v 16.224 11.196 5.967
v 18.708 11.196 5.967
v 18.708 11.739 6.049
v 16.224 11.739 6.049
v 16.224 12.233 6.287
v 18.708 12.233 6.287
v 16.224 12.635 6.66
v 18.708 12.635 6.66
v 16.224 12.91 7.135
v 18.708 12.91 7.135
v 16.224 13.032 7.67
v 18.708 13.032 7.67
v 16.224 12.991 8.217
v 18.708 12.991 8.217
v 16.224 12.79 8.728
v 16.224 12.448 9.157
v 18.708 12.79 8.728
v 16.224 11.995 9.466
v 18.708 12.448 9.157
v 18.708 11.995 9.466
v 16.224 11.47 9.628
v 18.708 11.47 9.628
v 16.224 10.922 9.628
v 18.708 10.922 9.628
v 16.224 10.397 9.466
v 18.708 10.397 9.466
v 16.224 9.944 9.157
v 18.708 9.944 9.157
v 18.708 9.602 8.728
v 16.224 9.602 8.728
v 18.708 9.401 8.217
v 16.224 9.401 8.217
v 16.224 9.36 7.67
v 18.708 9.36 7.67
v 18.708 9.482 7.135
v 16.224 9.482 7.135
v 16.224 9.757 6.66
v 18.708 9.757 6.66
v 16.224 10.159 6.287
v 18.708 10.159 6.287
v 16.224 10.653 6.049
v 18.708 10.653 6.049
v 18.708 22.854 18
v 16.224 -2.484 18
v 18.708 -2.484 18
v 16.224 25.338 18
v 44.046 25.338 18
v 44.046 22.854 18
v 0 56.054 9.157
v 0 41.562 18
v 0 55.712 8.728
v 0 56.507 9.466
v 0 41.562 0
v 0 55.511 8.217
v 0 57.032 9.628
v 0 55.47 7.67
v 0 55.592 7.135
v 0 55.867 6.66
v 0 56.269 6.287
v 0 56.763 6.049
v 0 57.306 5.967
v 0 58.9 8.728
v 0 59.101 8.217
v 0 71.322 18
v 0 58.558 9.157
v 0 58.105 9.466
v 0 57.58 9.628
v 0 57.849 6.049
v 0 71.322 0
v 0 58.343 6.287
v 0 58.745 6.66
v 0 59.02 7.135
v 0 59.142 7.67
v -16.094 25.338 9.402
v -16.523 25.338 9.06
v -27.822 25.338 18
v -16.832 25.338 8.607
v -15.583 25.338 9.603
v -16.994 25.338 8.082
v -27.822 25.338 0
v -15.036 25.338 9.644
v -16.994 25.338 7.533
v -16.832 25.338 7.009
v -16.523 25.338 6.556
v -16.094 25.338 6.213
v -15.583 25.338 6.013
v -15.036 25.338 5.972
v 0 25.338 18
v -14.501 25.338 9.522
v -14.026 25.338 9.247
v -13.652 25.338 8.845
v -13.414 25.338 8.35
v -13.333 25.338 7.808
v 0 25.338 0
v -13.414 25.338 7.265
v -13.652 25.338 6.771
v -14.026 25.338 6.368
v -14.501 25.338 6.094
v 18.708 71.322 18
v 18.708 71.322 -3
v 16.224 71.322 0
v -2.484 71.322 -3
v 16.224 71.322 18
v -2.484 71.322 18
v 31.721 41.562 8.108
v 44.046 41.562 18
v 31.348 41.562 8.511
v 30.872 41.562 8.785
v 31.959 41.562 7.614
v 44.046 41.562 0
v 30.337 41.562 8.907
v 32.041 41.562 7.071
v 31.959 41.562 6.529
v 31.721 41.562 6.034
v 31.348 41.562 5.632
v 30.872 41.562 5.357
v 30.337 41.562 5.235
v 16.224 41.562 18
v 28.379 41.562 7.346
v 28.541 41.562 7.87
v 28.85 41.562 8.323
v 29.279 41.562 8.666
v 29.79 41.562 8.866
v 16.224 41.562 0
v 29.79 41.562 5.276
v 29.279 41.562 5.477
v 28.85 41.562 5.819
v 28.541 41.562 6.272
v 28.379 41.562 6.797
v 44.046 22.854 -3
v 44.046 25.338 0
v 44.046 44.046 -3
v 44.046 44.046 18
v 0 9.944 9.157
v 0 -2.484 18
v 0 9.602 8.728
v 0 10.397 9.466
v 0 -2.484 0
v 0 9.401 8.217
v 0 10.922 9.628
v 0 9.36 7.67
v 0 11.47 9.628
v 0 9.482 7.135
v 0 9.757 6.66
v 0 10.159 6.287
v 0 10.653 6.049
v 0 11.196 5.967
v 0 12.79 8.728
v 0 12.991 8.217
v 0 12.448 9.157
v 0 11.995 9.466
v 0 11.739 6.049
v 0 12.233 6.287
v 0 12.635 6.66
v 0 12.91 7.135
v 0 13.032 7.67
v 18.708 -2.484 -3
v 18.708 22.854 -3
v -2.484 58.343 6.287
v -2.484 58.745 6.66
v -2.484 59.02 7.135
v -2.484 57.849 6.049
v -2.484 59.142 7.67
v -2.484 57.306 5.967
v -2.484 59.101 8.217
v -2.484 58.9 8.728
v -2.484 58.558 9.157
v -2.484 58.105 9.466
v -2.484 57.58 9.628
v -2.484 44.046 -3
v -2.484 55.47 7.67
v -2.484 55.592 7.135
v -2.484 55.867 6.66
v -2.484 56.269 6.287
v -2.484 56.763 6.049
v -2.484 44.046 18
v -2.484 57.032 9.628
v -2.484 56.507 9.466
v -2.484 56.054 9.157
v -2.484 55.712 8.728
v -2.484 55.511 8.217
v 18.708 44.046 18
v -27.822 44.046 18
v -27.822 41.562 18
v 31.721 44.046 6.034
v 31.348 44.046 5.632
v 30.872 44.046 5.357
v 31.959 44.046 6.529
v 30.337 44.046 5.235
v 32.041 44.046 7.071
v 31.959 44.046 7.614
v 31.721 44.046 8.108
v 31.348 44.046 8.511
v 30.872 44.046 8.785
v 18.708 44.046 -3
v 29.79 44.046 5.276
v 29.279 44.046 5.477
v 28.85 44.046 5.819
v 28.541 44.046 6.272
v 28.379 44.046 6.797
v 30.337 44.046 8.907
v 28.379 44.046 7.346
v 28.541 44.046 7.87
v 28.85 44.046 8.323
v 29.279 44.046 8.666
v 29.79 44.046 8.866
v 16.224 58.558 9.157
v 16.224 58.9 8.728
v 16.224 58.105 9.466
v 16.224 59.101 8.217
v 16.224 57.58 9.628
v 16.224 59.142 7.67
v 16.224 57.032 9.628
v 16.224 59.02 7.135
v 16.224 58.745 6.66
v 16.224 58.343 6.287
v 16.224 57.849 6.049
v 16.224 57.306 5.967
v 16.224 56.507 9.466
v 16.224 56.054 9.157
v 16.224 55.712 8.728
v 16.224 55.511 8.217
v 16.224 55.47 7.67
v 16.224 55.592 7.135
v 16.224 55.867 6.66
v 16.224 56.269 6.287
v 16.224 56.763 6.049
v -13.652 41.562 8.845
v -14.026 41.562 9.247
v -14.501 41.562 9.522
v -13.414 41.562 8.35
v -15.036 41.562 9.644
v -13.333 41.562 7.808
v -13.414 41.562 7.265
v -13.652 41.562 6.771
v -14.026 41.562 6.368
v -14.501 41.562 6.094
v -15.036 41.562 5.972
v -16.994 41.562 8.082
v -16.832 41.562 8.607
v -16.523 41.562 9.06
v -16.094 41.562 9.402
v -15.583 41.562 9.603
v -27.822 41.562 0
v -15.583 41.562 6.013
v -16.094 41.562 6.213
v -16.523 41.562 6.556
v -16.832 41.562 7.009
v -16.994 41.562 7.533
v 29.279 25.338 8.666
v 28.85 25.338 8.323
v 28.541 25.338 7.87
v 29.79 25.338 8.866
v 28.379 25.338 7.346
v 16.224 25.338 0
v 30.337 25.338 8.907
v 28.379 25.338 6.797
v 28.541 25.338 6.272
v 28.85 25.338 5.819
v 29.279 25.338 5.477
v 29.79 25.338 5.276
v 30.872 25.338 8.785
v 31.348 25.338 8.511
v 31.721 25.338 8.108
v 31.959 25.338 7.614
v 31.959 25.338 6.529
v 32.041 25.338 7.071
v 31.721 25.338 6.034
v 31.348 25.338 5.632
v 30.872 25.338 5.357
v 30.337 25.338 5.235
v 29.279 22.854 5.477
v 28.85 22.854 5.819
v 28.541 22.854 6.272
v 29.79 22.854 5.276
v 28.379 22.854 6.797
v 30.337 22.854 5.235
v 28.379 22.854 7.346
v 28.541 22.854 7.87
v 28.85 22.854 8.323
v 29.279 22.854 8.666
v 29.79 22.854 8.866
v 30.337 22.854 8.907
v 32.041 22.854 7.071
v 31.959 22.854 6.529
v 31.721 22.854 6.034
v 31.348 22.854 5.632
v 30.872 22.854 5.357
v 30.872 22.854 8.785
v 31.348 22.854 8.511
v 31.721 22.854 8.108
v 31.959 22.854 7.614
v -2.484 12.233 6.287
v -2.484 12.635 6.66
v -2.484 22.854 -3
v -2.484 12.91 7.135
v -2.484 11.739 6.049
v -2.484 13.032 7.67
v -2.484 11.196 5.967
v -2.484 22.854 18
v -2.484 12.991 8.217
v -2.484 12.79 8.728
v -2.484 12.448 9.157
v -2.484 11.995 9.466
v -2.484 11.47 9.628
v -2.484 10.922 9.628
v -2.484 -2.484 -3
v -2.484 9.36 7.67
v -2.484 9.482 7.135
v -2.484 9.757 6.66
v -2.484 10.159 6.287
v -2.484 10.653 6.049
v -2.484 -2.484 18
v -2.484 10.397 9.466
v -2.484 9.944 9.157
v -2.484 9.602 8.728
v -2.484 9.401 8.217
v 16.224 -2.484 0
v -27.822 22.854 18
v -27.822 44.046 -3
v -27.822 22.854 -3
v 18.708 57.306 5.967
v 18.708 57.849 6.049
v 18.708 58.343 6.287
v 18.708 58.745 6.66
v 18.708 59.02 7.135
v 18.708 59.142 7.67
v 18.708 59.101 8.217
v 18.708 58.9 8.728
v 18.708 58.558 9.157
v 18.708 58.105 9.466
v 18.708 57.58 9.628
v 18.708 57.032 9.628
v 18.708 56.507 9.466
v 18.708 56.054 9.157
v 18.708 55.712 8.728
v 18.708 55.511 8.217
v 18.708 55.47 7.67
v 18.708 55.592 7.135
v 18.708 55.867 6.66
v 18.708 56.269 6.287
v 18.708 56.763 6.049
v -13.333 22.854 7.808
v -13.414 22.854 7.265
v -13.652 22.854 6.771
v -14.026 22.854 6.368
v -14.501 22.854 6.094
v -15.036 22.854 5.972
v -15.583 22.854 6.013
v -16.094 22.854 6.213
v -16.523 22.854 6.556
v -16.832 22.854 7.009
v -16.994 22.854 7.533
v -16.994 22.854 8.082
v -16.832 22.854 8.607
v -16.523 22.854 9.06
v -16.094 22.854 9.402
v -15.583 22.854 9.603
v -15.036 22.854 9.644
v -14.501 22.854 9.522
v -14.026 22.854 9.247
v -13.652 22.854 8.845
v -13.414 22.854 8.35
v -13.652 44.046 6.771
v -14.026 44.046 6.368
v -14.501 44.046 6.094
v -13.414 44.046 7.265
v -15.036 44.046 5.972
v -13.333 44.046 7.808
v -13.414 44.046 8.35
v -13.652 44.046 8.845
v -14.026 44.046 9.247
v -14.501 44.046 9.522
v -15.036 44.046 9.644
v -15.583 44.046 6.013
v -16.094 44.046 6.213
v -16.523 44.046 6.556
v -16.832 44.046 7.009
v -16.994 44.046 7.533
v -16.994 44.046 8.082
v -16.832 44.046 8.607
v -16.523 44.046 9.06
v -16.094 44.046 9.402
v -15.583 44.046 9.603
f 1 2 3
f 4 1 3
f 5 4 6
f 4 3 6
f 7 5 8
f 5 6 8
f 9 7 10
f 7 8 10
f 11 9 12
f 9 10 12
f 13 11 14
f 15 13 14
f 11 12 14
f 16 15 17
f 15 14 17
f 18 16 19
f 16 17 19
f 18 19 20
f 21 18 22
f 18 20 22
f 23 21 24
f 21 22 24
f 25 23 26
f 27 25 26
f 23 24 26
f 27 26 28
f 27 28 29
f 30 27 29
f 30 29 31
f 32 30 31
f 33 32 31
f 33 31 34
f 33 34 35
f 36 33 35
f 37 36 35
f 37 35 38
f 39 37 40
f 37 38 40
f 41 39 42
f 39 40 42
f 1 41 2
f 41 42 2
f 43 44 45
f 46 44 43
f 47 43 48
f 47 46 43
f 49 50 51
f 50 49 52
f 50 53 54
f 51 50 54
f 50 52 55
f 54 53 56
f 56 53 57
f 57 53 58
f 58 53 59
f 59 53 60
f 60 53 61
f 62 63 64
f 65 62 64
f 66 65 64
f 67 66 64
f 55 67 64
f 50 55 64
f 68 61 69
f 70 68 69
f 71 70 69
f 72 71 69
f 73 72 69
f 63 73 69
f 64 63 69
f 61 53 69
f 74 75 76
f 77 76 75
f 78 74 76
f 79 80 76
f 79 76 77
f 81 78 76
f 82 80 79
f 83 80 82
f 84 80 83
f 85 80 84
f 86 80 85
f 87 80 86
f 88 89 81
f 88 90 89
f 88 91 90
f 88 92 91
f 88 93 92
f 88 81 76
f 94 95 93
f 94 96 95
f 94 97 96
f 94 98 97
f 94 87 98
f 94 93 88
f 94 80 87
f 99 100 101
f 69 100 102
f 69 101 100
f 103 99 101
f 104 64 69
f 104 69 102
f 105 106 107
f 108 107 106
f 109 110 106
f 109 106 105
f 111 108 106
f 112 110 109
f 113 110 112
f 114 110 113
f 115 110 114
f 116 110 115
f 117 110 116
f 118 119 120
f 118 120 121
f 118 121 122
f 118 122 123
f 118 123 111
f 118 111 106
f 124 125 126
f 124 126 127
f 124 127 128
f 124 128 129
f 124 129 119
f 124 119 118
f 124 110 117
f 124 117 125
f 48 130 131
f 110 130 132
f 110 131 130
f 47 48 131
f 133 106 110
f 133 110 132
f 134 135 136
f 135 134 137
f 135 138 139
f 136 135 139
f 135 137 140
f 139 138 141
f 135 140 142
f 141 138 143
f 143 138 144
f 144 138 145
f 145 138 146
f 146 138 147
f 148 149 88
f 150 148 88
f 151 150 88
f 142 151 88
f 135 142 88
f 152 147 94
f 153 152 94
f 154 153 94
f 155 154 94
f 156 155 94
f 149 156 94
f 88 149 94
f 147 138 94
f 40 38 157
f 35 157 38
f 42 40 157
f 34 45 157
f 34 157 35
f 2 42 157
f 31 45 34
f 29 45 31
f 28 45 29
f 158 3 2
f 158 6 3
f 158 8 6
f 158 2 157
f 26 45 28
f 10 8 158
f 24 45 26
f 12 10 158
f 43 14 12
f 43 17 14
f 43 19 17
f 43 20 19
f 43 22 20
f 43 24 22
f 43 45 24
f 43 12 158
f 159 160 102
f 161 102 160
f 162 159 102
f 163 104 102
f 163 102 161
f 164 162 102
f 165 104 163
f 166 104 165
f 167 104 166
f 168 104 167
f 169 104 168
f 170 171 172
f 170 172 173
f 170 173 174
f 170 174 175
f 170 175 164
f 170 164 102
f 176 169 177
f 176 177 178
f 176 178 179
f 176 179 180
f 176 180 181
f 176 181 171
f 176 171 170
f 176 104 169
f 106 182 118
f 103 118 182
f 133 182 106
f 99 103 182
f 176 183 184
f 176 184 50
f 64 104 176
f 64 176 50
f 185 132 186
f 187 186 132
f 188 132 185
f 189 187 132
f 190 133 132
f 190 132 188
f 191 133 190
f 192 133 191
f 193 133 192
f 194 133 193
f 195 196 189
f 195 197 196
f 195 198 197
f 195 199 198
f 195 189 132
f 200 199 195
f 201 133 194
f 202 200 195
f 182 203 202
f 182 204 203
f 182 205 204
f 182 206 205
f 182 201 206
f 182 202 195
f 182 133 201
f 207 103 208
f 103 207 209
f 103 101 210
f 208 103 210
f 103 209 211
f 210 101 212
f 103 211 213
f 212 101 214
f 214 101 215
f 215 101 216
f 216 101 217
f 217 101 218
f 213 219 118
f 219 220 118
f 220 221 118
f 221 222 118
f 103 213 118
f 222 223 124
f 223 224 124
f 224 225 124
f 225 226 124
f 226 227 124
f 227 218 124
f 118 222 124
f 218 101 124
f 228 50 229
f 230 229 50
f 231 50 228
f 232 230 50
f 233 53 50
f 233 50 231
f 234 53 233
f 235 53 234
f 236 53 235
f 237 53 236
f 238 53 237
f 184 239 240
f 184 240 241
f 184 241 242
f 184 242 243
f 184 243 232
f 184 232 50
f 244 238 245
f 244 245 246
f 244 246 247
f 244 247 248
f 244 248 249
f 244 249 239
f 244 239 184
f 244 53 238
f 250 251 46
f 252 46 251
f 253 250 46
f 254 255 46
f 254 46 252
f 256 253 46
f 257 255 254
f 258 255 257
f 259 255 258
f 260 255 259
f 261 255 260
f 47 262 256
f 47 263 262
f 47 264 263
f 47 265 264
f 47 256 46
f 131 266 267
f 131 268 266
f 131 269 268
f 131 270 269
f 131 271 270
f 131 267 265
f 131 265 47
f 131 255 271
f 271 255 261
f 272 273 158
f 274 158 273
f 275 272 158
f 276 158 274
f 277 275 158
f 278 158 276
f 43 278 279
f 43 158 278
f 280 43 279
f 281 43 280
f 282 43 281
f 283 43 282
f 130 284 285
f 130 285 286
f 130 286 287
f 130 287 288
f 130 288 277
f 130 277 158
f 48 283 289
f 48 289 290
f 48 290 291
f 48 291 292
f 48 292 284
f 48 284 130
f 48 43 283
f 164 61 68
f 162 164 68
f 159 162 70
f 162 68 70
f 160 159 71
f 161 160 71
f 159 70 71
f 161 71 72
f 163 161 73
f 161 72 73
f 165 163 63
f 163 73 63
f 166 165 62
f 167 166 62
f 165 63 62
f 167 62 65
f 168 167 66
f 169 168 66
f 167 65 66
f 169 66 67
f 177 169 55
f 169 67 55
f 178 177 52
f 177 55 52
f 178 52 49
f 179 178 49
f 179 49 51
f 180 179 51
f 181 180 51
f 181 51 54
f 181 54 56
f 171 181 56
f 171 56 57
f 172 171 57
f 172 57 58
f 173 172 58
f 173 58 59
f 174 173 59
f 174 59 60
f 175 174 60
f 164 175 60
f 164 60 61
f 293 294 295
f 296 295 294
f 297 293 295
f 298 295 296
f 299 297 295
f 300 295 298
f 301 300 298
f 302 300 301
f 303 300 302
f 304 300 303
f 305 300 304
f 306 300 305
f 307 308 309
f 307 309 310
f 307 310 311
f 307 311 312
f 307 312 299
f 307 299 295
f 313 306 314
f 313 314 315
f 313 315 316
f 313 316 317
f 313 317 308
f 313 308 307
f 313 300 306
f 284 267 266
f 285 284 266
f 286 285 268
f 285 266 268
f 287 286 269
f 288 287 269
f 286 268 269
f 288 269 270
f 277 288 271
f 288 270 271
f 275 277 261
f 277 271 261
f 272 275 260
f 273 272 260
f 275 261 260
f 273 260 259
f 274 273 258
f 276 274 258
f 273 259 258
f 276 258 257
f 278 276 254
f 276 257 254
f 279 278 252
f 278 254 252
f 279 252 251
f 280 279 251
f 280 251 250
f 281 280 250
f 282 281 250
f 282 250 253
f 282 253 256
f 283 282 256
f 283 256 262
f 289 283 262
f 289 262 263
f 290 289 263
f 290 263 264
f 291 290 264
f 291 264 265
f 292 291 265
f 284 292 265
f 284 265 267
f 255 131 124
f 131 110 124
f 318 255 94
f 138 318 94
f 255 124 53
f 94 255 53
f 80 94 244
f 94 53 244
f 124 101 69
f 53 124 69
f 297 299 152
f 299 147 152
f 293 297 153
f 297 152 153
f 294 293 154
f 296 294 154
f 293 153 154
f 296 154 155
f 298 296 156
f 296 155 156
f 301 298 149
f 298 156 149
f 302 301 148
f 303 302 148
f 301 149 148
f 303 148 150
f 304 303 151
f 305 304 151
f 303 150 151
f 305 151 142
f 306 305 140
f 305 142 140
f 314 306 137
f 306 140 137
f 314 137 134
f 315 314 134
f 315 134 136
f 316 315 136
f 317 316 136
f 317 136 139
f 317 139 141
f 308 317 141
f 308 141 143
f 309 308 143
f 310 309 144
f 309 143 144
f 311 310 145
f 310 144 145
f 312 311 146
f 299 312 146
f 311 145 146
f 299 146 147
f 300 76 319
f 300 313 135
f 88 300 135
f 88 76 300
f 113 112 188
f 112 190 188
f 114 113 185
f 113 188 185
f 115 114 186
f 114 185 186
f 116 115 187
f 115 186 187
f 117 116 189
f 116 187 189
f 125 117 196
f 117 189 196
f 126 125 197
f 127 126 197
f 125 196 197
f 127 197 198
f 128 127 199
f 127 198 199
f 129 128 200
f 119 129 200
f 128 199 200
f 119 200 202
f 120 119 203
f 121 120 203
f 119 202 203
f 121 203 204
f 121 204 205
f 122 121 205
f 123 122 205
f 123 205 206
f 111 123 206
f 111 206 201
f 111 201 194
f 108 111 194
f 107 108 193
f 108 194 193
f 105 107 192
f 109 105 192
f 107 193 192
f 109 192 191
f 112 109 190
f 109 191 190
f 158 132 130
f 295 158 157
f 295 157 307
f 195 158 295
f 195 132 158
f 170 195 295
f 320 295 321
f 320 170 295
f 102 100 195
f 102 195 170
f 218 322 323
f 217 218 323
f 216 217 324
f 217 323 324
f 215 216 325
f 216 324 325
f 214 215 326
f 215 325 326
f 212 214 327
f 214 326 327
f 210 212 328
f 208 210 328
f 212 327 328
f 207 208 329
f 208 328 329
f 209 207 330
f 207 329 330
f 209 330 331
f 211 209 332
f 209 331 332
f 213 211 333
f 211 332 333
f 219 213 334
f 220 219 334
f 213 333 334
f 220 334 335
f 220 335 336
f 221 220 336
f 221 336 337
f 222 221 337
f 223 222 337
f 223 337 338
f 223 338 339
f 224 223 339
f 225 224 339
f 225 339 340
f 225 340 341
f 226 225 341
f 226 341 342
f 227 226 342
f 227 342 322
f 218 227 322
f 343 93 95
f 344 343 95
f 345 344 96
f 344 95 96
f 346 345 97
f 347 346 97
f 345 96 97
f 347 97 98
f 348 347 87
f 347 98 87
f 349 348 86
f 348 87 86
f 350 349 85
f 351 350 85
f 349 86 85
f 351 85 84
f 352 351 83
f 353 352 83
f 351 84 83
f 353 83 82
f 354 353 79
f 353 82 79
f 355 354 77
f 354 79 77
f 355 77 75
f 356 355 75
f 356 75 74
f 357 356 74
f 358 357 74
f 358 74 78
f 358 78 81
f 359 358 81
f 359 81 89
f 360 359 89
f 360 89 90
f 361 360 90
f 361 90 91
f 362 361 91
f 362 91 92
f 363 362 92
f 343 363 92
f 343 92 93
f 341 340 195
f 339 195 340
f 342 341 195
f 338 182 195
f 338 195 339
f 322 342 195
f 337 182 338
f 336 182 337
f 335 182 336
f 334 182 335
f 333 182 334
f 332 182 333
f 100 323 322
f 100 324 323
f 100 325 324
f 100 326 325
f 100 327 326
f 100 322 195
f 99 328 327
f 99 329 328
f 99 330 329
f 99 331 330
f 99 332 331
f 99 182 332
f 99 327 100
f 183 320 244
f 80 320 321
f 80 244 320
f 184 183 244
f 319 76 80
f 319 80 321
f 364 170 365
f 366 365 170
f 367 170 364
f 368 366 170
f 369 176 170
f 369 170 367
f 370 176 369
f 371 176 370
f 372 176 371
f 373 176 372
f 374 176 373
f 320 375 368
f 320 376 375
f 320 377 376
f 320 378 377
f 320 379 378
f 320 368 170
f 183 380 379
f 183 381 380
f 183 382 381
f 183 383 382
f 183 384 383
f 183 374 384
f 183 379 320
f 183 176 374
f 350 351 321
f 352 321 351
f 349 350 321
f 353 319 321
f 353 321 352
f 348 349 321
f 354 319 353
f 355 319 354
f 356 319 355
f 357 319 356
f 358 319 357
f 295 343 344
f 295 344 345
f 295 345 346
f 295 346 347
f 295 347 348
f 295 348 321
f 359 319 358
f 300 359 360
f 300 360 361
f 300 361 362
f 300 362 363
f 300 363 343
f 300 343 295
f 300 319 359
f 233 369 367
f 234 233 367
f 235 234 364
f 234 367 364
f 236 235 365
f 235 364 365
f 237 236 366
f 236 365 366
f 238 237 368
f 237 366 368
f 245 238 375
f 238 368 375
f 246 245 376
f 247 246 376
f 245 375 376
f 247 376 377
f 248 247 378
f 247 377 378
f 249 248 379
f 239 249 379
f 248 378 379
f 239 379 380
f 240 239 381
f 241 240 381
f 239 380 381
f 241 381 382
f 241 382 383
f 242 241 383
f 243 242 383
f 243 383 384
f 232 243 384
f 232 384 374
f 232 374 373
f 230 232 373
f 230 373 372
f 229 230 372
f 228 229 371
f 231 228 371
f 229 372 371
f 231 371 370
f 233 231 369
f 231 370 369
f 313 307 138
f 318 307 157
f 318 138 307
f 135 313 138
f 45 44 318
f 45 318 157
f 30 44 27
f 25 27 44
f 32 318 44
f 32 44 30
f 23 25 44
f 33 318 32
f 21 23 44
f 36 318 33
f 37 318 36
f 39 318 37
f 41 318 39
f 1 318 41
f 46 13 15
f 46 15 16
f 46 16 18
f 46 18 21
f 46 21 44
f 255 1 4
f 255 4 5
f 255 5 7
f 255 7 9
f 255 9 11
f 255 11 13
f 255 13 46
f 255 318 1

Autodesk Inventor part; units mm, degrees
ref_plane "YZ Plane" through (0, 0, 0) normal (1, 0, 0) x (0, 1, 0)
ref_plane "XZ Plane" through (0, 0, 0) normal (0, 1, 0) x (-1, 0, 0)
ref_plane "XY Plane" through (0, 0, 0) normal (0, 0, 1) x (1, 0, 0)
sketch "Sketch1" plane through (0, 0, 0) normal (0, 0, 1) x (1, 0, 0)
  line L0 (16.224, -2.484) -> (16.224, 25.338)
  line L1 (16.224, 25.338) -> (44.046, 25.338)
  line L2 (44.046, 41.562) -> (16.224, 41.562)
  line L3 (0, 41.562) -> (-27.822, 41.562)
  line L4 (-27.822, 25.338) -> (0, 25.338)
  line L5 (16.224, -2.484) -> (18.708, -2.484)
  line L6 (18.708, 44.046) -> (44.046, 44.046)
  line L7 (44.046, 22.854) -> (18.708, 22.854)
  line L8 (18.708, 22.854) -> (18.708, 0)
  line L9 (-2.484, 44.046) -> (-27.822, 44.046)
  line L10 (-27.822, 22.854) -> (-2.484, 22.854)
  line L11 (0, 0) -> (0, 25.338)
  line L12 (0, 41.562) -> (0, 71.322)
  line L13 (16.224, 71.322) -> (16.224, 41.562)
  line L14 (16.224, 25.338) -> (16.224, 0)
  line L15 (18.708, -2.484) -> (18.708, 22.854)
  line L16 (18.708, 44.046) -> (18.708, 71.322)
  line L17 (-2.484, 71.322) -> (-2.484, 44.046)
  line L18 (-2.484, 22.854) -> (-2.484, -2.484)
  line L19 (-27.822, 44.046) -> (-27.822, 41.562)
  line L20 (-27.822, 25.338) -> (-27.822, 22.854)
  line L21 (44.046, 44.046) -> (44.046, 41.562)
  line L22 (44.046, 25.338) -> (44.046, 22.854)
  line L23 (18.708, 71.322) -> (16.224, 71.322)
  line L24 (0, 71.322) -> (-2.484, 71.322)
  line L25 (-2.484, -2.484) -> (0, -2.484)
  line L26 (0, -2.484) -> (0, 1.997)
  point P0 (-25.338, 41.562)
  point P1 (-25.338, 25.338)
extrude "Extrusion1" add sketch "Sketch1" along normal blind 18
sketch "Sketch2" plane through (0, 0, 0) normal (0, 0, -1) x (-1, 0, 0)
  line L0 (2.484, 22.854) -> (2.484, -2.484) projected
  line L1 (27.822, 22.854) -> (2.484, 22.854) projected
  line L2 (27.822, 44.046) -> (27.822, 22.854) projected
  line L3 (2.484, 44.046) -> (27.822, 44.046) projected
  line L4 (2.484, 71.322) -> (2.484, 44.046) projected
  line L5 (-18.708, 71.322) -> (2.484, 71.322) projected
  line L6 (-18.708, 44.046) -> (-18.708, 71.322) projected
  line L7 (-44.046, 44.046) -> (-18.708, 44.046) projected
  line L8 (-44.046, 22.854) -> (-44.046, 44.046) projected
  line L9 (-18.708, 22.854) -> (-44.046, 22.854) projected
  line L10 (-18.708, -2.484) -> (-18.708, 22.854) projected
  line L11 (2.484, -2.484) -> (-18.708, -2.484) projected
  point P0 (0, 0)
extrude "Extrusion2" add sketch "Sketch2" along normal blind 3
sketch "Sketch3" plane through (-27.822, 44.046, 18) normal (0, 1, 0) x (1, 0, 0)
  circle A0 centre (12.6484, 10.1922) radius 1.841
  point P0 (27.822, 18)
extrude "Extrusion3" cut sketch "Sketch3" against normal blind 28
sketch "Sketch4" plane through (18.708, 44.046, 18) normal (0, 1, 0) x (1, 0, 0)
  circle A0 centre (11.4919, 10.9288) radius 1.841
  point P0 (-18.708, 18)
extrude "Extrusion4" cut sketch "Sketch4" against normal blind 28
sketch "Sketch5" plane through (18.708, 44.046, 18) normal (1, 0, 0) x (0, 0, -1)
  circle A0 centre (10.1922, -32.8499) radius 1.841
  circle A1 centre (10.1922, 13.2601) radius 1.841
  point P0 (18, -44.046)
extrude "Extrusion5" cut sketch "Sketch5" against normal blind 28
properties part number "Lifter Connecter"
